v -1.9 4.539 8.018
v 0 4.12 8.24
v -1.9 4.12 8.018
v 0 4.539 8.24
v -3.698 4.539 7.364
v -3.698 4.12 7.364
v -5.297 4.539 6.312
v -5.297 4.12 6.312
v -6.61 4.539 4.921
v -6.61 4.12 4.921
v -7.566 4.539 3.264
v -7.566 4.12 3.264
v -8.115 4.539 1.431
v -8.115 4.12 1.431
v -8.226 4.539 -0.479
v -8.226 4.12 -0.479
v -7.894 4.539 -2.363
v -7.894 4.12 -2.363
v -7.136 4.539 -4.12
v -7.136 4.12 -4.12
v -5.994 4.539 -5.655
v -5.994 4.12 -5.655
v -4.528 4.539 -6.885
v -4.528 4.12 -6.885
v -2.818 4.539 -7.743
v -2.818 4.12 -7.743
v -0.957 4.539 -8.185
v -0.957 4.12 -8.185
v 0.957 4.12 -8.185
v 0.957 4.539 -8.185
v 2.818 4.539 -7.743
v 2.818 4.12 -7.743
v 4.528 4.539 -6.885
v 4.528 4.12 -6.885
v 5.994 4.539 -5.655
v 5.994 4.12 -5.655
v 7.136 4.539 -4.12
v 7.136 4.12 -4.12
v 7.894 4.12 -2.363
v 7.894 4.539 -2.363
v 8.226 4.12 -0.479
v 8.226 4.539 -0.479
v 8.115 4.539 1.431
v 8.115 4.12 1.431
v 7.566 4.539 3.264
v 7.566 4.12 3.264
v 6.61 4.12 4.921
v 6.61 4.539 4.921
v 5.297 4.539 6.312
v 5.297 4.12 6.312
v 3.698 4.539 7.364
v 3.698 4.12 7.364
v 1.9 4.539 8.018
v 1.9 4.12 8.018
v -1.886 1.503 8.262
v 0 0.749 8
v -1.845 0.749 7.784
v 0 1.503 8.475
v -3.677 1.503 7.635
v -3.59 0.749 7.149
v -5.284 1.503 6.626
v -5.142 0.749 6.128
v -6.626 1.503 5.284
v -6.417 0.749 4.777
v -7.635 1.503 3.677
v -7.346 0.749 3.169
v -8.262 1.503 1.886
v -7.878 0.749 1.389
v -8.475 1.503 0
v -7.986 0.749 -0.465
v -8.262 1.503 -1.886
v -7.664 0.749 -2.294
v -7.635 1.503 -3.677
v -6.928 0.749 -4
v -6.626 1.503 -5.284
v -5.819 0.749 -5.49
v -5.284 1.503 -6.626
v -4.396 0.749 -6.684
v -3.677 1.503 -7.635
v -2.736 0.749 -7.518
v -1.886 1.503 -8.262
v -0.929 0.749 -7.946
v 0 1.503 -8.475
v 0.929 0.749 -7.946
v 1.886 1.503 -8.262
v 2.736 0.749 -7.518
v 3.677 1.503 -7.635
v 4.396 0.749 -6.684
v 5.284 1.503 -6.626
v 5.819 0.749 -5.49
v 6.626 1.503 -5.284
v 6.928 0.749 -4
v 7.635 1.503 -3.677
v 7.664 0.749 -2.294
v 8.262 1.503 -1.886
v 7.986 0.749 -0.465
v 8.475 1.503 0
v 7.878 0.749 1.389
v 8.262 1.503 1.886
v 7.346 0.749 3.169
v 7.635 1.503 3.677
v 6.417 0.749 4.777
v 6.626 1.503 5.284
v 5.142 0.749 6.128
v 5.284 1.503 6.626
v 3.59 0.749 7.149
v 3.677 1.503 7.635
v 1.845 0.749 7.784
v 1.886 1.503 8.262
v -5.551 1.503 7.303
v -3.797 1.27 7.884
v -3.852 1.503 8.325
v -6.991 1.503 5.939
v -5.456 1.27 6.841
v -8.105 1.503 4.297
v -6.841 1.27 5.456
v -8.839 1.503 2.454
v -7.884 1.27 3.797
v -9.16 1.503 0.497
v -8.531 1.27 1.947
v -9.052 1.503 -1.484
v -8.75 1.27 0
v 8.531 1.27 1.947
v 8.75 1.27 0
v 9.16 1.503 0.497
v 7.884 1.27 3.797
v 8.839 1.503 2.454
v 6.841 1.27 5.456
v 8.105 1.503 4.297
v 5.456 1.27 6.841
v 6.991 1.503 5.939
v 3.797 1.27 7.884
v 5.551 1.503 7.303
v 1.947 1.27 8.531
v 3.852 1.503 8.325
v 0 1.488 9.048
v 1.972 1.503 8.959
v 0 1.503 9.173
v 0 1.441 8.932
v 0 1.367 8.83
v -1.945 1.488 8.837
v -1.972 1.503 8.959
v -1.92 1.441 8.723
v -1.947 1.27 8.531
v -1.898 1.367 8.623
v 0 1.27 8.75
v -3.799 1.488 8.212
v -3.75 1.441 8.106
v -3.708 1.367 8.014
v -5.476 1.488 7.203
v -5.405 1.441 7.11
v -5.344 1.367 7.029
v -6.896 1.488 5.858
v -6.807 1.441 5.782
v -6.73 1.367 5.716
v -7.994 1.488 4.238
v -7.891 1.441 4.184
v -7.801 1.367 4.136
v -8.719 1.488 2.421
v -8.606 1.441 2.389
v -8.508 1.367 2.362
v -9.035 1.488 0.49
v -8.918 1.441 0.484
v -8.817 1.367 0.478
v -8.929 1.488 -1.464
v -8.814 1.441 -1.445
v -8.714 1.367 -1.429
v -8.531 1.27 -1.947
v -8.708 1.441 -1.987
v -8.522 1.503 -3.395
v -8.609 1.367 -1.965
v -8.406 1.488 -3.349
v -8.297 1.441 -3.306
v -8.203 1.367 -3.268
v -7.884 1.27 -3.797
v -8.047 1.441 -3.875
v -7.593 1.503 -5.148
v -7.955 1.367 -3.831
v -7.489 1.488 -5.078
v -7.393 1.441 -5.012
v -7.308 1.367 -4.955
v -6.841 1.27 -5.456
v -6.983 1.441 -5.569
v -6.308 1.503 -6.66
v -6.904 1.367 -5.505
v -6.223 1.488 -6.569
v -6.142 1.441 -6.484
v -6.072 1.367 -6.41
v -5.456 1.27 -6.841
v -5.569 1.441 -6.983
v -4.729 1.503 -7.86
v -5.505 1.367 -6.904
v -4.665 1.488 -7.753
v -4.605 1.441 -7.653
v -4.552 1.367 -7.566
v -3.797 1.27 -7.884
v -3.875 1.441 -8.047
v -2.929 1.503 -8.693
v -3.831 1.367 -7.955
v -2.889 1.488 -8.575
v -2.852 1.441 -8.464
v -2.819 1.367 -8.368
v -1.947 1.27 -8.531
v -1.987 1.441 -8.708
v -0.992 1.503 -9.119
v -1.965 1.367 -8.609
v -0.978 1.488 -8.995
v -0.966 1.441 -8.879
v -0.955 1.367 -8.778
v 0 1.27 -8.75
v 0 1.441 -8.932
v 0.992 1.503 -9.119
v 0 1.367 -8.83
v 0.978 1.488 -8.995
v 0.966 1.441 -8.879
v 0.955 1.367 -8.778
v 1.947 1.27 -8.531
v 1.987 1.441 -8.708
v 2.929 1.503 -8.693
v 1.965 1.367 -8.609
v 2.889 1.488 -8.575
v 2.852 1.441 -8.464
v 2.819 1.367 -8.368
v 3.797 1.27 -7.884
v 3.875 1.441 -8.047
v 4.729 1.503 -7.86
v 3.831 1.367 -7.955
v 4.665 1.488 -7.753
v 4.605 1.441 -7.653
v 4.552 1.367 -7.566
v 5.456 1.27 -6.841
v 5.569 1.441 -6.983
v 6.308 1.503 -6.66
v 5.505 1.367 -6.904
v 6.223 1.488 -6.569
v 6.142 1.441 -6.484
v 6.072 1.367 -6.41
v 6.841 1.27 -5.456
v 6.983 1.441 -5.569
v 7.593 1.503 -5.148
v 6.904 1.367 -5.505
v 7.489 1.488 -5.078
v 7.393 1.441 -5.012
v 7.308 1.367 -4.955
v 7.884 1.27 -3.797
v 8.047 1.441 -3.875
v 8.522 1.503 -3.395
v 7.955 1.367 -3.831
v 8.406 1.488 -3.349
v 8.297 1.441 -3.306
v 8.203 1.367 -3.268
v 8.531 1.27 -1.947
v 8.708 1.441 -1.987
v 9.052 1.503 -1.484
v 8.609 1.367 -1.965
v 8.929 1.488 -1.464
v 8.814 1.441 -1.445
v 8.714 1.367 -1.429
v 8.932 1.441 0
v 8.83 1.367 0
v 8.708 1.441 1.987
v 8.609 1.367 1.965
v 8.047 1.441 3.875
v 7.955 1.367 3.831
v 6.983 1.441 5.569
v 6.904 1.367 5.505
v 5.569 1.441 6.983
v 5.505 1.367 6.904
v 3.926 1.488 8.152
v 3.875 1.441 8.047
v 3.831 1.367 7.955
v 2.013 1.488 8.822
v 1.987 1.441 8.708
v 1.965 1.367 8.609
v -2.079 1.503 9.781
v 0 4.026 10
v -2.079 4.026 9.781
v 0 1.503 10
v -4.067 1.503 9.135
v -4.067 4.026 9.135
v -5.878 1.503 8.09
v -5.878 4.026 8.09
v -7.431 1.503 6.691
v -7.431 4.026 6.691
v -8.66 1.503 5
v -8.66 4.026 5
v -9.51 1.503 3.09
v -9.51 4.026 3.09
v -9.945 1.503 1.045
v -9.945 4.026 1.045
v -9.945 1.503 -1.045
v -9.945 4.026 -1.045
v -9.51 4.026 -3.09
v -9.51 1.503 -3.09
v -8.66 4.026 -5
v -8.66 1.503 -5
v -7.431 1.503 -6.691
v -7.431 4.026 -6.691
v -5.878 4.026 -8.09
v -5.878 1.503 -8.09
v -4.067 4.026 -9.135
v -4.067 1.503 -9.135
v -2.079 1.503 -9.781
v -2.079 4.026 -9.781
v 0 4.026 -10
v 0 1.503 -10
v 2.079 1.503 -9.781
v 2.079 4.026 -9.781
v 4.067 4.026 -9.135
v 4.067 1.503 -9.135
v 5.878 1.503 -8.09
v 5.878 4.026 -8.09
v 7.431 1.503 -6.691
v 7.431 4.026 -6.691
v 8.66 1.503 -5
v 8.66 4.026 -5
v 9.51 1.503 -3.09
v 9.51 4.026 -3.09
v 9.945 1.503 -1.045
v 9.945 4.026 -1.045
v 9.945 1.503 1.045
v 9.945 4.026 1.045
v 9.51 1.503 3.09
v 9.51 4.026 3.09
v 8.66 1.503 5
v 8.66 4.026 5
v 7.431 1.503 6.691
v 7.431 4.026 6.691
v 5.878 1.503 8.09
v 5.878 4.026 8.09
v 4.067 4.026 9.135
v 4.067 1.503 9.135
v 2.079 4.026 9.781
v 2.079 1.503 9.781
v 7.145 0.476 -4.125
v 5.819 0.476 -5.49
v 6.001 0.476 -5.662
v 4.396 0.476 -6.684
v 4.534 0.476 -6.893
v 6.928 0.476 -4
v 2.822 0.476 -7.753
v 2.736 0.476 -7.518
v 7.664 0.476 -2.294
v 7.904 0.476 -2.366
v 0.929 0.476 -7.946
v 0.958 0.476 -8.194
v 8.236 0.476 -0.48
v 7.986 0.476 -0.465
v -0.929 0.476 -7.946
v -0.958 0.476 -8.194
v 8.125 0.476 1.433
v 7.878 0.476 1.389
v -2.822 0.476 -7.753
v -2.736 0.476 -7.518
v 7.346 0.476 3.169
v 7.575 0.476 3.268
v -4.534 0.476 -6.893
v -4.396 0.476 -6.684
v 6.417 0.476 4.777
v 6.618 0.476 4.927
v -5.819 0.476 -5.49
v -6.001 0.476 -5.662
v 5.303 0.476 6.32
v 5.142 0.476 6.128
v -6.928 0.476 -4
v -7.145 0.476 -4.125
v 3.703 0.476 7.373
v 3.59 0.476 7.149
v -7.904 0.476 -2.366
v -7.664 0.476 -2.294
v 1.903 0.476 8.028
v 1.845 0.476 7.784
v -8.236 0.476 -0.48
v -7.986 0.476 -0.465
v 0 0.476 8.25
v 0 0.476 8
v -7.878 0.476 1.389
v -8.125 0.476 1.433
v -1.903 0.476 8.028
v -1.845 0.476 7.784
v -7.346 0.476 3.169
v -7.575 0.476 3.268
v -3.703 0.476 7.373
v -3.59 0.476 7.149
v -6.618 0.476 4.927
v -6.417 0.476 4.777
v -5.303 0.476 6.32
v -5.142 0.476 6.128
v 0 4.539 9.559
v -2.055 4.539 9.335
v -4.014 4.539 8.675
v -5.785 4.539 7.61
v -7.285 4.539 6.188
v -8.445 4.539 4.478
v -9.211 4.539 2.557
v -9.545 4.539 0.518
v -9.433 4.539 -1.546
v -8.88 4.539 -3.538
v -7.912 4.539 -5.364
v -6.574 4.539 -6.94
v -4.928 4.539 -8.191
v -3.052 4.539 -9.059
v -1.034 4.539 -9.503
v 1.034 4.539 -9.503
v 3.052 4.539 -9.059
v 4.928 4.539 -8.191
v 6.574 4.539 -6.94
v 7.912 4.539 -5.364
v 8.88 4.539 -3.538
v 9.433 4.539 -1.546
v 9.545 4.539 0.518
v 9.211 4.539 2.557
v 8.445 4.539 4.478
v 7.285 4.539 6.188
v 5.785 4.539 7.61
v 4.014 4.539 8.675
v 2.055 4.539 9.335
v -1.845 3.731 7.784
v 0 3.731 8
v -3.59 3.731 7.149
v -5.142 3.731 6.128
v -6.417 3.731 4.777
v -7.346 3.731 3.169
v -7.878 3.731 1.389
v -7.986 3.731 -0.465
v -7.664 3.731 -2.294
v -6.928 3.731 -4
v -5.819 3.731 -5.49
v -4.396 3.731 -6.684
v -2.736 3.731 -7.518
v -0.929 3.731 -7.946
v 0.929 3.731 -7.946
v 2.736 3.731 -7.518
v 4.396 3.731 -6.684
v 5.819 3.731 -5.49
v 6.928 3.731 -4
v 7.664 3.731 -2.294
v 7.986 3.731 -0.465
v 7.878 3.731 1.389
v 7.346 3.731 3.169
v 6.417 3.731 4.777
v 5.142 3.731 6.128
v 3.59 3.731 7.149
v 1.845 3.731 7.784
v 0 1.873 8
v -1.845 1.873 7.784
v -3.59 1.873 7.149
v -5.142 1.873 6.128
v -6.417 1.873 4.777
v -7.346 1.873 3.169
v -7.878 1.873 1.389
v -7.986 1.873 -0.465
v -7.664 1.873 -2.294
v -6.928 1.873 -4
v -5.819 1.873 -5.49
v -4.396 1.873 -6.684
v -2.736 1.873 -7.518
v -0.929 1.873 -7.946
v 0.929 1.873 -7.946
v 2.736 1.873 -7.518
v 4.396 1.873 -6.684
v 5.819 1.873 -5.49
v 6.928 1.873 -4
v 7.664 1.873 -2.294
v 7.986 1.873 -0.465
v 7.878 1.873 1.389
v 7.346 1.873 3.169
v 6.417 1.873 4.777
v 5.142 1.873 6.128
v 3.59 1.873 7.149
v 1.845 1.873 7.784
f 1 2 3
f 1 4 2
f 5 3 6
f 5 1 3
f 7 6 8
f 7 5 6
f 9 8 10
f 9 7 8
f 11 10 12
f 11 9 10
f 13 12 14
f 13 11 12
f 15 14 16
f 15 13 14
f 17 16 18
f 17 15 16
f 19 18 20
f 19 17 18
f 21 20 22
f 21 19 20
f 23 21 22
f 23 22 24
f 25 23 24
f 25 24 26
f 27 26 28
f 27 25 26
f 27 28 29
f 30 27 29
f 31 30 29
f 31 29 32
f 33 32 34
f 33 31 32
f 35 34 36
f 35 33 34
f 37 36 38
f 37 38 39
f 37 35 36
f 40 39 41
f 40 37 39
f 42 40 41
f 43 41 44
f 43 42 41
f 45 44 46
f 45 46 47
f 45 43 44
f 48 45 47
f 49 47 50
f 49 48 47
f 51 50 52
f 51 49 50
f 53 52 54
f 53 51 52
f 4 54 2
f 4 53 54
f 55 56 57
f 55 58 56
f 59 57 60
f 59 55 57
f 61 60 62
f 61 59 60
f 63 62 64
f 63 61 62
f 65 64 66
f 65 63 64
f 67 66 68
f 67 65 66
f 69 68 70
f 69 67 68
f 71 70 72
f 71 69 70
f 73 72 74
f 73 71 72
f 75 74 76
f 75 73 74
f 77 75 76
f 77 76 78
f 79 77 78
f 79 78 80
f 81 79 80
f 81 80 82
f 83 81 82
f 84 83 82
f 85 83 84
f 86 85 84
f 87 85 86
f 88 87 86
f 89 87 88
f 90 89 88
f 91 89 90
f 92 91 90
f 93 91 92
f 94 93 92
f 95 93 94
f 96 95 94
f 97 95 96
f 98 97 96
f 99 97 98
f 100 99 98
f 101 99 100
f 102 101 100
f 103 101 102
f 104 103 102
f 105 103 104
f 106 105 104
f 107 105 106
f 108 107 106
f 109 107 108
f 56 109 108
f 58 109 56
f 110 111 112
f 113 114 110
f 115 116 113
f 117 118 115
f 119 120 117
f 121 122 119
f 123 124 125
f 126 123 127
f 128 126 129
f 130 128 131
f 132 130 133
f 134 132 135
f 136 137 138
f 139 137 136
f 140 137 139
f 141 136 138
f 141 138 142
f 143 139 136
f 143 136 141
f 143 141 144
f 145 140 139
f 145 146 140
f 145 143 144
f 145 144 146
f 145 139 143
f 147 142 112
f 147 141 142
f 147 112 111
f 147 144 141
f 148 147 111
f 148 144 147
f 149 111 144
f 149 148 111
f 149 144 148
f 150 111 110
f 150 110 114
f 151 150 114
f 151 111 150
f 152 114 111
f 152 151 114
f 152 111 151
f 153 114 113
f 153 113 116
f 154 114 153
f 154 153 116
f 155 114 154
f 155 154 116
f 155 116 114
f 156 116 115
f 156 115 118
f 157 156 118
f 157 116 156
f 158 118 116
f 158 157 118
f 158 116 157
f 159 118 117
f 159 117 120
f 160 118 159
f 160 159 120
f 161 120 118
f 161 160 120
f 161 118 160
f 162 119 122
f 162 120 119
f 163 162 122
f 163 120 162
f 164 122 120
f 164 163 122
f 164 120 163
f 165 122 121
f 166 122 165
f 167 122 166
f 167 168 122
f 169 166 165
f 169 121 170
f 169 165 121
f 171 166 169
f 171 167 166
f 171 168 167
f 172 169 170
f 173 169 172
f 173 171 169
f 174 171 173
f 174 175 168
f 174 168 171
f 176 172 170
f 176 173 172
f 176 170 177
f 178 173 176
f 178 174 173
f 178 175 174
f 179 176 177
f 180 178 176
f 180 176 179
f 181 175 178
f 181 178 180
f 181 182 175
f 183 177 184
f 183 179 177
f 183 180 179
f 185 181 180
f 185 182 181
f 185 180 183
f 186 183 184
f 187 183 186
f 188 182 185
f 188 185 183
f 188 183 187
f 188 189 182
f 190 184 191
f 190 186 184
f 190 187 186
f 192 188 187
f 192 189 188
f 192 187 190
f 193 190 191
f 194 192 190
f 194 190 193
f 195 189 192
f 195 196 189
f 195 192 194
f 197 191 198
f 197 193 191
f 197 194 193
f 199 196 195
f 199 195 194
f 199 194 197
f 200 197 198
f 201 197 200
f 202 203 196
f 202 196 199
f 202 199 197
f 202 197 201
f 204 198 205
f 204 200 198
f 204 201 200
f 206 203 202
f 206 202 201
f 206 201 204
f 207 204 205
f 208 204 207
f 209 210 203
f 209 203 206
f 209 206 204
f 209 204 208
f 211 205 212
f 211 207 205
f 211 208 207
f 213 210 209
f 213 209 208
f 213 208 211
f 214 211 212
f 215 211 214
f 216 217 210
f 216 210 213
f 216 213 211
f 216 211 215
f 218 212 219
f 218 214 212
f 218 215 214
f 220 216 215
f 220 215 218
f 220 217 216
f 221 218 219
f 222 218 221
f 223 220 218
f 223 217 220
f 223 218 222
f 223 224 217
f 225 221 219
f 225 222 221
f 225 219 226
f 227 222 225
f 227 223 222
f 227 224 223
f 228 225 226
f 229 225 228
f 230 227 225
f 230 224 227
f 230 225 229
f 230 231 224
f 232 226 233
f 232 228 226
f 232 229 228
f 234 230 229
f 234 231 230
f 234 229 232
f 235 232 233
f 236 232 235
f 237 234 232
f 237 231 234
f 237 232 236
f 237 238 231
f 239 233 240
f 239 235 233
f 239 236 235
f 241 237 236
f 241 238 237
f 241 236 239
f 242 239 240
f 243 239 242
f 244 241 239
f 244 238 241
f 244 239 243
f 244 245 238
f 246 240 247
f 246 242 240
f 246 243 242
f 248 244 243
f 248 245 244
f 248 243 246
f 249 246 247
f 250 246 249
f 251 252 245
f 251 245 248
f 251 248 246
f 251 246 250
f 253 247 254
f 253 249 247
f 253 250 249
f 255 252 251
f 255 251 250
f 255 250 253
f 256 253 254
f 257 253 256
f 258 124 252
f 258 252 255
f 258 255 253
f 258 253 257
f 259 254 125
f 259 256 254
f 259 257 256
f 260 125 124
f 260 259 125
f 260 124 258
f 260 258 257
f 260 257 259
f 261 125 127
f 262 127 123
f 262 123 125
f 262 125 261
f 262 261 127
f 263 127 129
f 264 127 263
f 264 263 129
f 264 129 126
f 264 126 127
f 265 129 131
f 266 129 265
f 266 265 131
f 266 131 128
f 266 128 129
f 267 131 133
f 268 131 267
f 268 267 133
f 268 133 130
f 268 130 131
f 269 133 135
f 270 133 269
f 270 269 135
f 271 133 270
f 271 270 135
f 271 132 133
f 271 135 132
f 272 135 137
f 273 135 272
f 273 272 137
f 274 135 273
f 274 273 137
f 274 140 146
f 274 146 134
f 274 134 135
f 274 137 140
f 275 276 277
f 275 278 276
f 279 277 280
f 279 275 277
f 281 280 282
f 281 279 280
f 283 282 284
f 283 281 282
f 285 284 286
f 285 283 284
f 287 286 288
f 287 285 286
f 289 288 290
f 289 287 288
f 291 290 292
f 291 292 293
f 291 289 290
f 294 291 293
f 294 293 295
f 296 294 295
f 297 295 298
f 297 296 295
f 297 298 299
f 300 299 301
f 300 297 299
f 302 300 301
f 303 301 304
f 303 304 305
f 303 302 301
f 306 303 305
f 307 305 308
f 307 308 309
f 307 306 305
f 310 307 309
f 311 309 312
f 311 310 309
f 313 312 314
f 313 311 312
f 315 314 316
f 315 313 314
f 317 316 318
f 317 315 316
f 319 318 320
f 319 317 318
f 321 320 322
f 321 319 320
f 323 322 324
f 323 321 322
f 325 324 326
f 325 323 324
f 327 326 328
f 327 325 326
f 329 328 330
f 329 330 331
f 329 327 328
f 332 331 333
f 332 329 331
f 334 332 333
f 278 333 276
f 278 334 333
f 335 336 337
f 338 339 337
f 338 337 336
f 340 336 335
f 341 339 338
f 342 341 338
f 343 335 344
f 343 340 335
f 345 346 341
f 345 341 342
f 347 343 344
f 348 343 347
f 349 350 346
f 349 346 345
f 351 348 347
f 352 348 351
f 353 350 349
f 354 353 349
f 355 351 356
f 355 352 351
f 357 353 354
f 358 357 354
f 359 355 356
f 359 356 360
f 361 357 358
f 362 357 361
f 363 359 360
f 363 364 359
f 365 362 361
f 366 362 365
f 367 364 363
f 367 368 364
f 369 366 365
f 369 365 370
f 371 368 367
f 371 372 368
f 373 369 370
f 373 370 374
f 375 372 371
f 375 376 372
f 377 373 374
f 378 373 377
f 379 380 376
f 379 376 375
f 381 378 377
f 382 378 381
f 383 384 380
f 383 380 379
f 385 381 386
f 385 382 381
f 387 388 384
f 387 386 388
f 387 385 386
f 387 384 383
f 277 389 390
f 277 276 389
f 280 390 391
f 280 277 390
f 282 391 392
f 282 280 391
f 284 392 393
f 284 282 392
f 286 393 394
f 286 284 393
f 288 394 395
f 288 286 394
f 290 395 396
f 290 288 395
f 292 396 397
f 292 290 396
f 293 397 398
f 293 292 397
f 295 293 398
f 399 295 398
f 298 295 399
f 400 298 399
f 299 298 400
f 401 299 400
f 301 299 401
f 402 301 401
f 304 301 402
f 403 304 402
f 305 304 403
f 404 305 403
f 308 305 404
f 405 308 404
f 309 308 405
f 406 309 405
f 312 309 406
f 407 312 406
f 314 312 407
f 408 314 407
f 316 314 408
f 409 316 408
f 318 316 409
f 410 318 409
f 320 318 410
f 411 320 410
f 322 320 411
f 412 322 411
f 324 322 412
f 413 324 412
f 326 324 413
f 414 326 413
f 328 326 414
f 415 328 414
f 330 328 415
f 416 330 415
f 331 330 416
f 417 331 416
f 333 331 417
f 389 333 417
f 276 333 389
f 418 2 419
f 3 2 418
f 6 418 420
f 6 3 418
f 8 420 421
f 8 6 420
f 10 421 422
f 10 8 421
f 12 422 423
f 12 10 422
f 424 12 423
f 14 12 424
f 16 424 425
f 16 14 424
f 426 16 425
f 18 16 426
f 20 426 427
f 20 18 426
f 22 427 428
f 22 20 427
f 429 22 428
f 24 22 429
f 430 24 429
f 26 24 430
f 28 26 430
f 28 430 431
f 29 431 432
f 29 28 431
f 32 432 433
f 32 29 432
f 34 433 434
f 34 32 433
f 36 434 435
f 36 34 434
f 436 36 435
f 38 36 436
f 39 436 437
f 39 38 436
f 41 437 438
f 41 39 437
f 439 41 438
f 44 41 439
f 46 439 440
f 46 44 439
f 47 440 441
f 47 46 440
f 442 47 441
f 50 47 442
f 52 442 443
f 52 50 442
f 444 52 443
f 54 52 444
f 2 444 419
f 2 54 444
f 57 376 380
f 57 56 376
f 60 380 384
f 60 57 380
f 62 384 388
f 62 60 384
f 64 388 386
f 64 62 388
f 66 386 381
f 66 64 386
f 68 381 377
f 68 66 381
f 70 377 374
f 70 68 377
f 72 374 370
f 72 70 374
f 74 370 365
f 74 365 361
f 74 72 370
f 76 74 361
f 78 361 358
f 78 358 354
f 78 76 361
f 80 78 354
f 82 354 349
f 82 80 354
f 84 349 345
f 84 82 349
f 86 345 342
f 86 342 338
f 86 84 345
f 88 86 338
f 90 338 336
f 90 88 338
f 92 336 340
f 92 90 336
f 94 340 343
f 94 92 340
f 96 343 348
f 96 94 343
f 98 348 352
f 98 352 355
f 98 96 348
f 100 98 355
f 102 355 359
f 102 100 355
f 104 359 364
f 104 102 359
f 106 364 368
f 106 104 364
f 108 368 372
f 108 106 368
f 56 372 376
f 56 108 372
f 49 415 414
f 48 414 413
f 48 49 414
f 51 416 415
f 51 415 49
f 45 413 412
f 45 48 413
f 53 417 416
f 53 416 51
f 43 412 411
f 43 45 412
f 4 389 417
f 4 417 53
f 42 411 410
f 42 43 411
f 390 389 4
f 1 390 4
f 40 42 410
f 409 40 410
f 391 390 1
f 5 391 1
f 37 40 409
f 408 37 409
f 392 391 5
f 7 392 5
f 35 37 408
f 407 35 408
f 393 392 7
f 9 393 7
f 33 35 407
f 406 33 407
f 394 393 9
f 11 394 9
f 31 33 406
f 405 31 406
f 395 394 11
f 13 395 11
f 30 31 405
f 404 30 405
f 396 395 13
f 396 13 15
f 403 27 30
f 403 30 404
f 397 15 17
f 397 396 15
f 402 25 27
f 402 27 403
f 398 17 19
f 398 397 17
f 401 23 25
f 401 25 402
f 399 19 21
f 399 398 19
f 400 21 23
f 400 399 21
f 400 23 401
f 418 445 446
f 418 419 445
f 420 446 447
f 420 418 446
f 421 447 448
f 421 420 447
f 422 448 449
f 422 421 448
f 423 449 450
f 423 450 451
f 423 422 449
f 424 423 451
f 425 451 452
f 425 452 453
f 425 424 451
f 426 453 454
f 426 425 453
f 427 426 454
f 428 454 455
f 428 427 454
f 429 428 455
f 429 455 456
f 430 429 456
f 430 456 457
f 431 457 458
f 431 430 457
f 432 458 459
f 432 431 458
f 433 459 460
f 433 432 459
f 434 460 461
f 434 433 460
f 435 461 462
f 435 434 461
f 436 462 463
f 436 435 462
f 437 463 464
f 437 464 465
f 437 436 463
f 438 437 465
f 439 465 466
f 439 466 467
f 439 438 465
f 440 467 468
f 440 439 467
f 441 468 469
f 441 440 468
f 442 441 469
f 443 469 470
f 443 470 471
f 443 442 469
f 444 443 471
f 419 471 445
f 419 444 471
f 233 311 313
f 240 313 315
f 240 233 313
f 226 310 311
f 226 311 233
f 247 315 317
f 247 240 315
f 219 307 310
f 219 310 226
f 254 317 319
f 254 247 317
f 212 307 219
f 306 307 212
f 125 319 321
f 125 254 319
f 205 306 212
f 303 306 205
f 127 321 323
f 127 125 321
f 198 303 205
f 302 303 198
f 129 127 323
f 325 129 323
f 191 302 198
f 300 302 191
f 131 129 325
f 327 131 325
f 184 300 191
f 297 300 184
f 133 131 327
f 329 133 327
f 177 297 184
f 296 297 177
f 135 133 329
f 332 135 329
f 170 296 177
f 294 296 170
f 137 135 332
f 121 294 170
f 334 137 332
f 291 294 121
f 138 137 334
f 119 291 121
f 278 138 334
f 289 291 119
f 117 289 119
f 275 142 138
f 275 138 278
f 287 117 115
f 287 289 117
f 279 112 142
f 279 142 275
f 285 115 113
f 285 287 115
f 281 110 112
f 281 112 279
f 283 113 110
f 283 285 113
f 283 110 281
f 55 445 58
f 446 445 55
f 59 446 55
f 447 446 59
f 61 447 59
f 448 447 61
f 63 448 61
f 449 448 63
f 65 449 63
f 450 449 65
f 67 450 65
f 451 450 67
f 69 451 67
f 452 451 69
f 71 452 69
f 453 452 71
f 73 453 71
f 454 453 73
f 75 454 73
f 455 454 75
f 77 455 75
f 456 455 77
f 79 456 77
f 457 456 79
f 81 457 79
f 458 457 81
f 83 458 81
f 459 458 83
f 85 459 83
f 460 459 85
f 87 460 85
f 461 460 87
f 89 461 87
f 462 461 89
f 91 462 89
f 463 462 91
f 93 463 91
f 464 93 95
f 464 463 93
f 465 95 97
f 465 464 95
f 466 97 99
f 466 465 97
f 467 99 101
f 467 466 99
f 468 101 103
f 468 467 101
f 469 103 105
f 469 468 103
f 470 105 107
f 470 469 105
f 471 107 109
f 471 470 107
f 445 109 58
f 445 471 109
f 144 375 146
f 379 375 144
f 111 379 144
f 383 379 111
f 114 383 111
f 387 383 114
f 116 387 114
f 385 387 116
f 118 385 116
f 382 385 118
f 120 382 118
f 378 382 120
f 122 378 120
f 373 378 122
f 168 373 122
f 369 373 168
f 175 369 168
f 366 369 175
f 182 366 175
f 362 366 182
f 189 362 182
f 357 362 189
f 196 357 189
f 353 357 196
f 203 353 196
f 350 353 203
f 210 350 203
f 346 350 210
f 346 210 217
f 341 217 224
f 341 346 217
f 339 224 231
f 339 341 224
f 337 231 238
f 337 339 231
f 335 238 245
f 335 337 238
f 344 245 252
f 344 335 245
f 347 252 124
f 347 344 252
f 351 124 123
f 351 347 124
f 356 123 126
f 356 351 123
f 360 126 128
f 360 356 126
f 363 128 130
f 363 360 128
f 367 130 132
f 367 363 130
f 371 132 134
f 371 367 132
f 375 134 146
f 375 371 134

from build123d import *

# Parameters (mm, degrees)
REDONDEO1_R = 0.5


with BuildPart() as part:
    # Croquis1 → Revolución1 (revolve)
    with BuildSketch(Plane.XY, mode=Mode.PRIVATE) as revoluci_n1_sk:
        Polygon((-8, 1.873006462), (-8, 3.730556499), (-8.240342635, 4.120291582), (-8.240342635, 4.539307424), (-9.558967924, 4.539307424), (-9.999624488, 4.02630535), (-9.999624488, 1.503449512), (-8.897118424, 1.503449512), (-8.250134341, 0.475546819), (-8, 0.475546819), (-8, 0.749389269), (-8.474621749, 1.503449512), align=None)
    revolve(revoluci_n1_sk.sketch.rotate(Axis((0, 26.098695966, 0), (0, -1, 0)), 270), axis=Axis((0, 26.098695966, 0), (0, -1, 0)))

    # Redondeo1
    redondeo1_edges = [part.edges().sort_by_distance(p)[0] for p in [
        (0, 1.503449512, -8.897118424),
    ]]
    fillet(redondeo1_edges, radius=REDONDEO1_R)


solid = part.part
